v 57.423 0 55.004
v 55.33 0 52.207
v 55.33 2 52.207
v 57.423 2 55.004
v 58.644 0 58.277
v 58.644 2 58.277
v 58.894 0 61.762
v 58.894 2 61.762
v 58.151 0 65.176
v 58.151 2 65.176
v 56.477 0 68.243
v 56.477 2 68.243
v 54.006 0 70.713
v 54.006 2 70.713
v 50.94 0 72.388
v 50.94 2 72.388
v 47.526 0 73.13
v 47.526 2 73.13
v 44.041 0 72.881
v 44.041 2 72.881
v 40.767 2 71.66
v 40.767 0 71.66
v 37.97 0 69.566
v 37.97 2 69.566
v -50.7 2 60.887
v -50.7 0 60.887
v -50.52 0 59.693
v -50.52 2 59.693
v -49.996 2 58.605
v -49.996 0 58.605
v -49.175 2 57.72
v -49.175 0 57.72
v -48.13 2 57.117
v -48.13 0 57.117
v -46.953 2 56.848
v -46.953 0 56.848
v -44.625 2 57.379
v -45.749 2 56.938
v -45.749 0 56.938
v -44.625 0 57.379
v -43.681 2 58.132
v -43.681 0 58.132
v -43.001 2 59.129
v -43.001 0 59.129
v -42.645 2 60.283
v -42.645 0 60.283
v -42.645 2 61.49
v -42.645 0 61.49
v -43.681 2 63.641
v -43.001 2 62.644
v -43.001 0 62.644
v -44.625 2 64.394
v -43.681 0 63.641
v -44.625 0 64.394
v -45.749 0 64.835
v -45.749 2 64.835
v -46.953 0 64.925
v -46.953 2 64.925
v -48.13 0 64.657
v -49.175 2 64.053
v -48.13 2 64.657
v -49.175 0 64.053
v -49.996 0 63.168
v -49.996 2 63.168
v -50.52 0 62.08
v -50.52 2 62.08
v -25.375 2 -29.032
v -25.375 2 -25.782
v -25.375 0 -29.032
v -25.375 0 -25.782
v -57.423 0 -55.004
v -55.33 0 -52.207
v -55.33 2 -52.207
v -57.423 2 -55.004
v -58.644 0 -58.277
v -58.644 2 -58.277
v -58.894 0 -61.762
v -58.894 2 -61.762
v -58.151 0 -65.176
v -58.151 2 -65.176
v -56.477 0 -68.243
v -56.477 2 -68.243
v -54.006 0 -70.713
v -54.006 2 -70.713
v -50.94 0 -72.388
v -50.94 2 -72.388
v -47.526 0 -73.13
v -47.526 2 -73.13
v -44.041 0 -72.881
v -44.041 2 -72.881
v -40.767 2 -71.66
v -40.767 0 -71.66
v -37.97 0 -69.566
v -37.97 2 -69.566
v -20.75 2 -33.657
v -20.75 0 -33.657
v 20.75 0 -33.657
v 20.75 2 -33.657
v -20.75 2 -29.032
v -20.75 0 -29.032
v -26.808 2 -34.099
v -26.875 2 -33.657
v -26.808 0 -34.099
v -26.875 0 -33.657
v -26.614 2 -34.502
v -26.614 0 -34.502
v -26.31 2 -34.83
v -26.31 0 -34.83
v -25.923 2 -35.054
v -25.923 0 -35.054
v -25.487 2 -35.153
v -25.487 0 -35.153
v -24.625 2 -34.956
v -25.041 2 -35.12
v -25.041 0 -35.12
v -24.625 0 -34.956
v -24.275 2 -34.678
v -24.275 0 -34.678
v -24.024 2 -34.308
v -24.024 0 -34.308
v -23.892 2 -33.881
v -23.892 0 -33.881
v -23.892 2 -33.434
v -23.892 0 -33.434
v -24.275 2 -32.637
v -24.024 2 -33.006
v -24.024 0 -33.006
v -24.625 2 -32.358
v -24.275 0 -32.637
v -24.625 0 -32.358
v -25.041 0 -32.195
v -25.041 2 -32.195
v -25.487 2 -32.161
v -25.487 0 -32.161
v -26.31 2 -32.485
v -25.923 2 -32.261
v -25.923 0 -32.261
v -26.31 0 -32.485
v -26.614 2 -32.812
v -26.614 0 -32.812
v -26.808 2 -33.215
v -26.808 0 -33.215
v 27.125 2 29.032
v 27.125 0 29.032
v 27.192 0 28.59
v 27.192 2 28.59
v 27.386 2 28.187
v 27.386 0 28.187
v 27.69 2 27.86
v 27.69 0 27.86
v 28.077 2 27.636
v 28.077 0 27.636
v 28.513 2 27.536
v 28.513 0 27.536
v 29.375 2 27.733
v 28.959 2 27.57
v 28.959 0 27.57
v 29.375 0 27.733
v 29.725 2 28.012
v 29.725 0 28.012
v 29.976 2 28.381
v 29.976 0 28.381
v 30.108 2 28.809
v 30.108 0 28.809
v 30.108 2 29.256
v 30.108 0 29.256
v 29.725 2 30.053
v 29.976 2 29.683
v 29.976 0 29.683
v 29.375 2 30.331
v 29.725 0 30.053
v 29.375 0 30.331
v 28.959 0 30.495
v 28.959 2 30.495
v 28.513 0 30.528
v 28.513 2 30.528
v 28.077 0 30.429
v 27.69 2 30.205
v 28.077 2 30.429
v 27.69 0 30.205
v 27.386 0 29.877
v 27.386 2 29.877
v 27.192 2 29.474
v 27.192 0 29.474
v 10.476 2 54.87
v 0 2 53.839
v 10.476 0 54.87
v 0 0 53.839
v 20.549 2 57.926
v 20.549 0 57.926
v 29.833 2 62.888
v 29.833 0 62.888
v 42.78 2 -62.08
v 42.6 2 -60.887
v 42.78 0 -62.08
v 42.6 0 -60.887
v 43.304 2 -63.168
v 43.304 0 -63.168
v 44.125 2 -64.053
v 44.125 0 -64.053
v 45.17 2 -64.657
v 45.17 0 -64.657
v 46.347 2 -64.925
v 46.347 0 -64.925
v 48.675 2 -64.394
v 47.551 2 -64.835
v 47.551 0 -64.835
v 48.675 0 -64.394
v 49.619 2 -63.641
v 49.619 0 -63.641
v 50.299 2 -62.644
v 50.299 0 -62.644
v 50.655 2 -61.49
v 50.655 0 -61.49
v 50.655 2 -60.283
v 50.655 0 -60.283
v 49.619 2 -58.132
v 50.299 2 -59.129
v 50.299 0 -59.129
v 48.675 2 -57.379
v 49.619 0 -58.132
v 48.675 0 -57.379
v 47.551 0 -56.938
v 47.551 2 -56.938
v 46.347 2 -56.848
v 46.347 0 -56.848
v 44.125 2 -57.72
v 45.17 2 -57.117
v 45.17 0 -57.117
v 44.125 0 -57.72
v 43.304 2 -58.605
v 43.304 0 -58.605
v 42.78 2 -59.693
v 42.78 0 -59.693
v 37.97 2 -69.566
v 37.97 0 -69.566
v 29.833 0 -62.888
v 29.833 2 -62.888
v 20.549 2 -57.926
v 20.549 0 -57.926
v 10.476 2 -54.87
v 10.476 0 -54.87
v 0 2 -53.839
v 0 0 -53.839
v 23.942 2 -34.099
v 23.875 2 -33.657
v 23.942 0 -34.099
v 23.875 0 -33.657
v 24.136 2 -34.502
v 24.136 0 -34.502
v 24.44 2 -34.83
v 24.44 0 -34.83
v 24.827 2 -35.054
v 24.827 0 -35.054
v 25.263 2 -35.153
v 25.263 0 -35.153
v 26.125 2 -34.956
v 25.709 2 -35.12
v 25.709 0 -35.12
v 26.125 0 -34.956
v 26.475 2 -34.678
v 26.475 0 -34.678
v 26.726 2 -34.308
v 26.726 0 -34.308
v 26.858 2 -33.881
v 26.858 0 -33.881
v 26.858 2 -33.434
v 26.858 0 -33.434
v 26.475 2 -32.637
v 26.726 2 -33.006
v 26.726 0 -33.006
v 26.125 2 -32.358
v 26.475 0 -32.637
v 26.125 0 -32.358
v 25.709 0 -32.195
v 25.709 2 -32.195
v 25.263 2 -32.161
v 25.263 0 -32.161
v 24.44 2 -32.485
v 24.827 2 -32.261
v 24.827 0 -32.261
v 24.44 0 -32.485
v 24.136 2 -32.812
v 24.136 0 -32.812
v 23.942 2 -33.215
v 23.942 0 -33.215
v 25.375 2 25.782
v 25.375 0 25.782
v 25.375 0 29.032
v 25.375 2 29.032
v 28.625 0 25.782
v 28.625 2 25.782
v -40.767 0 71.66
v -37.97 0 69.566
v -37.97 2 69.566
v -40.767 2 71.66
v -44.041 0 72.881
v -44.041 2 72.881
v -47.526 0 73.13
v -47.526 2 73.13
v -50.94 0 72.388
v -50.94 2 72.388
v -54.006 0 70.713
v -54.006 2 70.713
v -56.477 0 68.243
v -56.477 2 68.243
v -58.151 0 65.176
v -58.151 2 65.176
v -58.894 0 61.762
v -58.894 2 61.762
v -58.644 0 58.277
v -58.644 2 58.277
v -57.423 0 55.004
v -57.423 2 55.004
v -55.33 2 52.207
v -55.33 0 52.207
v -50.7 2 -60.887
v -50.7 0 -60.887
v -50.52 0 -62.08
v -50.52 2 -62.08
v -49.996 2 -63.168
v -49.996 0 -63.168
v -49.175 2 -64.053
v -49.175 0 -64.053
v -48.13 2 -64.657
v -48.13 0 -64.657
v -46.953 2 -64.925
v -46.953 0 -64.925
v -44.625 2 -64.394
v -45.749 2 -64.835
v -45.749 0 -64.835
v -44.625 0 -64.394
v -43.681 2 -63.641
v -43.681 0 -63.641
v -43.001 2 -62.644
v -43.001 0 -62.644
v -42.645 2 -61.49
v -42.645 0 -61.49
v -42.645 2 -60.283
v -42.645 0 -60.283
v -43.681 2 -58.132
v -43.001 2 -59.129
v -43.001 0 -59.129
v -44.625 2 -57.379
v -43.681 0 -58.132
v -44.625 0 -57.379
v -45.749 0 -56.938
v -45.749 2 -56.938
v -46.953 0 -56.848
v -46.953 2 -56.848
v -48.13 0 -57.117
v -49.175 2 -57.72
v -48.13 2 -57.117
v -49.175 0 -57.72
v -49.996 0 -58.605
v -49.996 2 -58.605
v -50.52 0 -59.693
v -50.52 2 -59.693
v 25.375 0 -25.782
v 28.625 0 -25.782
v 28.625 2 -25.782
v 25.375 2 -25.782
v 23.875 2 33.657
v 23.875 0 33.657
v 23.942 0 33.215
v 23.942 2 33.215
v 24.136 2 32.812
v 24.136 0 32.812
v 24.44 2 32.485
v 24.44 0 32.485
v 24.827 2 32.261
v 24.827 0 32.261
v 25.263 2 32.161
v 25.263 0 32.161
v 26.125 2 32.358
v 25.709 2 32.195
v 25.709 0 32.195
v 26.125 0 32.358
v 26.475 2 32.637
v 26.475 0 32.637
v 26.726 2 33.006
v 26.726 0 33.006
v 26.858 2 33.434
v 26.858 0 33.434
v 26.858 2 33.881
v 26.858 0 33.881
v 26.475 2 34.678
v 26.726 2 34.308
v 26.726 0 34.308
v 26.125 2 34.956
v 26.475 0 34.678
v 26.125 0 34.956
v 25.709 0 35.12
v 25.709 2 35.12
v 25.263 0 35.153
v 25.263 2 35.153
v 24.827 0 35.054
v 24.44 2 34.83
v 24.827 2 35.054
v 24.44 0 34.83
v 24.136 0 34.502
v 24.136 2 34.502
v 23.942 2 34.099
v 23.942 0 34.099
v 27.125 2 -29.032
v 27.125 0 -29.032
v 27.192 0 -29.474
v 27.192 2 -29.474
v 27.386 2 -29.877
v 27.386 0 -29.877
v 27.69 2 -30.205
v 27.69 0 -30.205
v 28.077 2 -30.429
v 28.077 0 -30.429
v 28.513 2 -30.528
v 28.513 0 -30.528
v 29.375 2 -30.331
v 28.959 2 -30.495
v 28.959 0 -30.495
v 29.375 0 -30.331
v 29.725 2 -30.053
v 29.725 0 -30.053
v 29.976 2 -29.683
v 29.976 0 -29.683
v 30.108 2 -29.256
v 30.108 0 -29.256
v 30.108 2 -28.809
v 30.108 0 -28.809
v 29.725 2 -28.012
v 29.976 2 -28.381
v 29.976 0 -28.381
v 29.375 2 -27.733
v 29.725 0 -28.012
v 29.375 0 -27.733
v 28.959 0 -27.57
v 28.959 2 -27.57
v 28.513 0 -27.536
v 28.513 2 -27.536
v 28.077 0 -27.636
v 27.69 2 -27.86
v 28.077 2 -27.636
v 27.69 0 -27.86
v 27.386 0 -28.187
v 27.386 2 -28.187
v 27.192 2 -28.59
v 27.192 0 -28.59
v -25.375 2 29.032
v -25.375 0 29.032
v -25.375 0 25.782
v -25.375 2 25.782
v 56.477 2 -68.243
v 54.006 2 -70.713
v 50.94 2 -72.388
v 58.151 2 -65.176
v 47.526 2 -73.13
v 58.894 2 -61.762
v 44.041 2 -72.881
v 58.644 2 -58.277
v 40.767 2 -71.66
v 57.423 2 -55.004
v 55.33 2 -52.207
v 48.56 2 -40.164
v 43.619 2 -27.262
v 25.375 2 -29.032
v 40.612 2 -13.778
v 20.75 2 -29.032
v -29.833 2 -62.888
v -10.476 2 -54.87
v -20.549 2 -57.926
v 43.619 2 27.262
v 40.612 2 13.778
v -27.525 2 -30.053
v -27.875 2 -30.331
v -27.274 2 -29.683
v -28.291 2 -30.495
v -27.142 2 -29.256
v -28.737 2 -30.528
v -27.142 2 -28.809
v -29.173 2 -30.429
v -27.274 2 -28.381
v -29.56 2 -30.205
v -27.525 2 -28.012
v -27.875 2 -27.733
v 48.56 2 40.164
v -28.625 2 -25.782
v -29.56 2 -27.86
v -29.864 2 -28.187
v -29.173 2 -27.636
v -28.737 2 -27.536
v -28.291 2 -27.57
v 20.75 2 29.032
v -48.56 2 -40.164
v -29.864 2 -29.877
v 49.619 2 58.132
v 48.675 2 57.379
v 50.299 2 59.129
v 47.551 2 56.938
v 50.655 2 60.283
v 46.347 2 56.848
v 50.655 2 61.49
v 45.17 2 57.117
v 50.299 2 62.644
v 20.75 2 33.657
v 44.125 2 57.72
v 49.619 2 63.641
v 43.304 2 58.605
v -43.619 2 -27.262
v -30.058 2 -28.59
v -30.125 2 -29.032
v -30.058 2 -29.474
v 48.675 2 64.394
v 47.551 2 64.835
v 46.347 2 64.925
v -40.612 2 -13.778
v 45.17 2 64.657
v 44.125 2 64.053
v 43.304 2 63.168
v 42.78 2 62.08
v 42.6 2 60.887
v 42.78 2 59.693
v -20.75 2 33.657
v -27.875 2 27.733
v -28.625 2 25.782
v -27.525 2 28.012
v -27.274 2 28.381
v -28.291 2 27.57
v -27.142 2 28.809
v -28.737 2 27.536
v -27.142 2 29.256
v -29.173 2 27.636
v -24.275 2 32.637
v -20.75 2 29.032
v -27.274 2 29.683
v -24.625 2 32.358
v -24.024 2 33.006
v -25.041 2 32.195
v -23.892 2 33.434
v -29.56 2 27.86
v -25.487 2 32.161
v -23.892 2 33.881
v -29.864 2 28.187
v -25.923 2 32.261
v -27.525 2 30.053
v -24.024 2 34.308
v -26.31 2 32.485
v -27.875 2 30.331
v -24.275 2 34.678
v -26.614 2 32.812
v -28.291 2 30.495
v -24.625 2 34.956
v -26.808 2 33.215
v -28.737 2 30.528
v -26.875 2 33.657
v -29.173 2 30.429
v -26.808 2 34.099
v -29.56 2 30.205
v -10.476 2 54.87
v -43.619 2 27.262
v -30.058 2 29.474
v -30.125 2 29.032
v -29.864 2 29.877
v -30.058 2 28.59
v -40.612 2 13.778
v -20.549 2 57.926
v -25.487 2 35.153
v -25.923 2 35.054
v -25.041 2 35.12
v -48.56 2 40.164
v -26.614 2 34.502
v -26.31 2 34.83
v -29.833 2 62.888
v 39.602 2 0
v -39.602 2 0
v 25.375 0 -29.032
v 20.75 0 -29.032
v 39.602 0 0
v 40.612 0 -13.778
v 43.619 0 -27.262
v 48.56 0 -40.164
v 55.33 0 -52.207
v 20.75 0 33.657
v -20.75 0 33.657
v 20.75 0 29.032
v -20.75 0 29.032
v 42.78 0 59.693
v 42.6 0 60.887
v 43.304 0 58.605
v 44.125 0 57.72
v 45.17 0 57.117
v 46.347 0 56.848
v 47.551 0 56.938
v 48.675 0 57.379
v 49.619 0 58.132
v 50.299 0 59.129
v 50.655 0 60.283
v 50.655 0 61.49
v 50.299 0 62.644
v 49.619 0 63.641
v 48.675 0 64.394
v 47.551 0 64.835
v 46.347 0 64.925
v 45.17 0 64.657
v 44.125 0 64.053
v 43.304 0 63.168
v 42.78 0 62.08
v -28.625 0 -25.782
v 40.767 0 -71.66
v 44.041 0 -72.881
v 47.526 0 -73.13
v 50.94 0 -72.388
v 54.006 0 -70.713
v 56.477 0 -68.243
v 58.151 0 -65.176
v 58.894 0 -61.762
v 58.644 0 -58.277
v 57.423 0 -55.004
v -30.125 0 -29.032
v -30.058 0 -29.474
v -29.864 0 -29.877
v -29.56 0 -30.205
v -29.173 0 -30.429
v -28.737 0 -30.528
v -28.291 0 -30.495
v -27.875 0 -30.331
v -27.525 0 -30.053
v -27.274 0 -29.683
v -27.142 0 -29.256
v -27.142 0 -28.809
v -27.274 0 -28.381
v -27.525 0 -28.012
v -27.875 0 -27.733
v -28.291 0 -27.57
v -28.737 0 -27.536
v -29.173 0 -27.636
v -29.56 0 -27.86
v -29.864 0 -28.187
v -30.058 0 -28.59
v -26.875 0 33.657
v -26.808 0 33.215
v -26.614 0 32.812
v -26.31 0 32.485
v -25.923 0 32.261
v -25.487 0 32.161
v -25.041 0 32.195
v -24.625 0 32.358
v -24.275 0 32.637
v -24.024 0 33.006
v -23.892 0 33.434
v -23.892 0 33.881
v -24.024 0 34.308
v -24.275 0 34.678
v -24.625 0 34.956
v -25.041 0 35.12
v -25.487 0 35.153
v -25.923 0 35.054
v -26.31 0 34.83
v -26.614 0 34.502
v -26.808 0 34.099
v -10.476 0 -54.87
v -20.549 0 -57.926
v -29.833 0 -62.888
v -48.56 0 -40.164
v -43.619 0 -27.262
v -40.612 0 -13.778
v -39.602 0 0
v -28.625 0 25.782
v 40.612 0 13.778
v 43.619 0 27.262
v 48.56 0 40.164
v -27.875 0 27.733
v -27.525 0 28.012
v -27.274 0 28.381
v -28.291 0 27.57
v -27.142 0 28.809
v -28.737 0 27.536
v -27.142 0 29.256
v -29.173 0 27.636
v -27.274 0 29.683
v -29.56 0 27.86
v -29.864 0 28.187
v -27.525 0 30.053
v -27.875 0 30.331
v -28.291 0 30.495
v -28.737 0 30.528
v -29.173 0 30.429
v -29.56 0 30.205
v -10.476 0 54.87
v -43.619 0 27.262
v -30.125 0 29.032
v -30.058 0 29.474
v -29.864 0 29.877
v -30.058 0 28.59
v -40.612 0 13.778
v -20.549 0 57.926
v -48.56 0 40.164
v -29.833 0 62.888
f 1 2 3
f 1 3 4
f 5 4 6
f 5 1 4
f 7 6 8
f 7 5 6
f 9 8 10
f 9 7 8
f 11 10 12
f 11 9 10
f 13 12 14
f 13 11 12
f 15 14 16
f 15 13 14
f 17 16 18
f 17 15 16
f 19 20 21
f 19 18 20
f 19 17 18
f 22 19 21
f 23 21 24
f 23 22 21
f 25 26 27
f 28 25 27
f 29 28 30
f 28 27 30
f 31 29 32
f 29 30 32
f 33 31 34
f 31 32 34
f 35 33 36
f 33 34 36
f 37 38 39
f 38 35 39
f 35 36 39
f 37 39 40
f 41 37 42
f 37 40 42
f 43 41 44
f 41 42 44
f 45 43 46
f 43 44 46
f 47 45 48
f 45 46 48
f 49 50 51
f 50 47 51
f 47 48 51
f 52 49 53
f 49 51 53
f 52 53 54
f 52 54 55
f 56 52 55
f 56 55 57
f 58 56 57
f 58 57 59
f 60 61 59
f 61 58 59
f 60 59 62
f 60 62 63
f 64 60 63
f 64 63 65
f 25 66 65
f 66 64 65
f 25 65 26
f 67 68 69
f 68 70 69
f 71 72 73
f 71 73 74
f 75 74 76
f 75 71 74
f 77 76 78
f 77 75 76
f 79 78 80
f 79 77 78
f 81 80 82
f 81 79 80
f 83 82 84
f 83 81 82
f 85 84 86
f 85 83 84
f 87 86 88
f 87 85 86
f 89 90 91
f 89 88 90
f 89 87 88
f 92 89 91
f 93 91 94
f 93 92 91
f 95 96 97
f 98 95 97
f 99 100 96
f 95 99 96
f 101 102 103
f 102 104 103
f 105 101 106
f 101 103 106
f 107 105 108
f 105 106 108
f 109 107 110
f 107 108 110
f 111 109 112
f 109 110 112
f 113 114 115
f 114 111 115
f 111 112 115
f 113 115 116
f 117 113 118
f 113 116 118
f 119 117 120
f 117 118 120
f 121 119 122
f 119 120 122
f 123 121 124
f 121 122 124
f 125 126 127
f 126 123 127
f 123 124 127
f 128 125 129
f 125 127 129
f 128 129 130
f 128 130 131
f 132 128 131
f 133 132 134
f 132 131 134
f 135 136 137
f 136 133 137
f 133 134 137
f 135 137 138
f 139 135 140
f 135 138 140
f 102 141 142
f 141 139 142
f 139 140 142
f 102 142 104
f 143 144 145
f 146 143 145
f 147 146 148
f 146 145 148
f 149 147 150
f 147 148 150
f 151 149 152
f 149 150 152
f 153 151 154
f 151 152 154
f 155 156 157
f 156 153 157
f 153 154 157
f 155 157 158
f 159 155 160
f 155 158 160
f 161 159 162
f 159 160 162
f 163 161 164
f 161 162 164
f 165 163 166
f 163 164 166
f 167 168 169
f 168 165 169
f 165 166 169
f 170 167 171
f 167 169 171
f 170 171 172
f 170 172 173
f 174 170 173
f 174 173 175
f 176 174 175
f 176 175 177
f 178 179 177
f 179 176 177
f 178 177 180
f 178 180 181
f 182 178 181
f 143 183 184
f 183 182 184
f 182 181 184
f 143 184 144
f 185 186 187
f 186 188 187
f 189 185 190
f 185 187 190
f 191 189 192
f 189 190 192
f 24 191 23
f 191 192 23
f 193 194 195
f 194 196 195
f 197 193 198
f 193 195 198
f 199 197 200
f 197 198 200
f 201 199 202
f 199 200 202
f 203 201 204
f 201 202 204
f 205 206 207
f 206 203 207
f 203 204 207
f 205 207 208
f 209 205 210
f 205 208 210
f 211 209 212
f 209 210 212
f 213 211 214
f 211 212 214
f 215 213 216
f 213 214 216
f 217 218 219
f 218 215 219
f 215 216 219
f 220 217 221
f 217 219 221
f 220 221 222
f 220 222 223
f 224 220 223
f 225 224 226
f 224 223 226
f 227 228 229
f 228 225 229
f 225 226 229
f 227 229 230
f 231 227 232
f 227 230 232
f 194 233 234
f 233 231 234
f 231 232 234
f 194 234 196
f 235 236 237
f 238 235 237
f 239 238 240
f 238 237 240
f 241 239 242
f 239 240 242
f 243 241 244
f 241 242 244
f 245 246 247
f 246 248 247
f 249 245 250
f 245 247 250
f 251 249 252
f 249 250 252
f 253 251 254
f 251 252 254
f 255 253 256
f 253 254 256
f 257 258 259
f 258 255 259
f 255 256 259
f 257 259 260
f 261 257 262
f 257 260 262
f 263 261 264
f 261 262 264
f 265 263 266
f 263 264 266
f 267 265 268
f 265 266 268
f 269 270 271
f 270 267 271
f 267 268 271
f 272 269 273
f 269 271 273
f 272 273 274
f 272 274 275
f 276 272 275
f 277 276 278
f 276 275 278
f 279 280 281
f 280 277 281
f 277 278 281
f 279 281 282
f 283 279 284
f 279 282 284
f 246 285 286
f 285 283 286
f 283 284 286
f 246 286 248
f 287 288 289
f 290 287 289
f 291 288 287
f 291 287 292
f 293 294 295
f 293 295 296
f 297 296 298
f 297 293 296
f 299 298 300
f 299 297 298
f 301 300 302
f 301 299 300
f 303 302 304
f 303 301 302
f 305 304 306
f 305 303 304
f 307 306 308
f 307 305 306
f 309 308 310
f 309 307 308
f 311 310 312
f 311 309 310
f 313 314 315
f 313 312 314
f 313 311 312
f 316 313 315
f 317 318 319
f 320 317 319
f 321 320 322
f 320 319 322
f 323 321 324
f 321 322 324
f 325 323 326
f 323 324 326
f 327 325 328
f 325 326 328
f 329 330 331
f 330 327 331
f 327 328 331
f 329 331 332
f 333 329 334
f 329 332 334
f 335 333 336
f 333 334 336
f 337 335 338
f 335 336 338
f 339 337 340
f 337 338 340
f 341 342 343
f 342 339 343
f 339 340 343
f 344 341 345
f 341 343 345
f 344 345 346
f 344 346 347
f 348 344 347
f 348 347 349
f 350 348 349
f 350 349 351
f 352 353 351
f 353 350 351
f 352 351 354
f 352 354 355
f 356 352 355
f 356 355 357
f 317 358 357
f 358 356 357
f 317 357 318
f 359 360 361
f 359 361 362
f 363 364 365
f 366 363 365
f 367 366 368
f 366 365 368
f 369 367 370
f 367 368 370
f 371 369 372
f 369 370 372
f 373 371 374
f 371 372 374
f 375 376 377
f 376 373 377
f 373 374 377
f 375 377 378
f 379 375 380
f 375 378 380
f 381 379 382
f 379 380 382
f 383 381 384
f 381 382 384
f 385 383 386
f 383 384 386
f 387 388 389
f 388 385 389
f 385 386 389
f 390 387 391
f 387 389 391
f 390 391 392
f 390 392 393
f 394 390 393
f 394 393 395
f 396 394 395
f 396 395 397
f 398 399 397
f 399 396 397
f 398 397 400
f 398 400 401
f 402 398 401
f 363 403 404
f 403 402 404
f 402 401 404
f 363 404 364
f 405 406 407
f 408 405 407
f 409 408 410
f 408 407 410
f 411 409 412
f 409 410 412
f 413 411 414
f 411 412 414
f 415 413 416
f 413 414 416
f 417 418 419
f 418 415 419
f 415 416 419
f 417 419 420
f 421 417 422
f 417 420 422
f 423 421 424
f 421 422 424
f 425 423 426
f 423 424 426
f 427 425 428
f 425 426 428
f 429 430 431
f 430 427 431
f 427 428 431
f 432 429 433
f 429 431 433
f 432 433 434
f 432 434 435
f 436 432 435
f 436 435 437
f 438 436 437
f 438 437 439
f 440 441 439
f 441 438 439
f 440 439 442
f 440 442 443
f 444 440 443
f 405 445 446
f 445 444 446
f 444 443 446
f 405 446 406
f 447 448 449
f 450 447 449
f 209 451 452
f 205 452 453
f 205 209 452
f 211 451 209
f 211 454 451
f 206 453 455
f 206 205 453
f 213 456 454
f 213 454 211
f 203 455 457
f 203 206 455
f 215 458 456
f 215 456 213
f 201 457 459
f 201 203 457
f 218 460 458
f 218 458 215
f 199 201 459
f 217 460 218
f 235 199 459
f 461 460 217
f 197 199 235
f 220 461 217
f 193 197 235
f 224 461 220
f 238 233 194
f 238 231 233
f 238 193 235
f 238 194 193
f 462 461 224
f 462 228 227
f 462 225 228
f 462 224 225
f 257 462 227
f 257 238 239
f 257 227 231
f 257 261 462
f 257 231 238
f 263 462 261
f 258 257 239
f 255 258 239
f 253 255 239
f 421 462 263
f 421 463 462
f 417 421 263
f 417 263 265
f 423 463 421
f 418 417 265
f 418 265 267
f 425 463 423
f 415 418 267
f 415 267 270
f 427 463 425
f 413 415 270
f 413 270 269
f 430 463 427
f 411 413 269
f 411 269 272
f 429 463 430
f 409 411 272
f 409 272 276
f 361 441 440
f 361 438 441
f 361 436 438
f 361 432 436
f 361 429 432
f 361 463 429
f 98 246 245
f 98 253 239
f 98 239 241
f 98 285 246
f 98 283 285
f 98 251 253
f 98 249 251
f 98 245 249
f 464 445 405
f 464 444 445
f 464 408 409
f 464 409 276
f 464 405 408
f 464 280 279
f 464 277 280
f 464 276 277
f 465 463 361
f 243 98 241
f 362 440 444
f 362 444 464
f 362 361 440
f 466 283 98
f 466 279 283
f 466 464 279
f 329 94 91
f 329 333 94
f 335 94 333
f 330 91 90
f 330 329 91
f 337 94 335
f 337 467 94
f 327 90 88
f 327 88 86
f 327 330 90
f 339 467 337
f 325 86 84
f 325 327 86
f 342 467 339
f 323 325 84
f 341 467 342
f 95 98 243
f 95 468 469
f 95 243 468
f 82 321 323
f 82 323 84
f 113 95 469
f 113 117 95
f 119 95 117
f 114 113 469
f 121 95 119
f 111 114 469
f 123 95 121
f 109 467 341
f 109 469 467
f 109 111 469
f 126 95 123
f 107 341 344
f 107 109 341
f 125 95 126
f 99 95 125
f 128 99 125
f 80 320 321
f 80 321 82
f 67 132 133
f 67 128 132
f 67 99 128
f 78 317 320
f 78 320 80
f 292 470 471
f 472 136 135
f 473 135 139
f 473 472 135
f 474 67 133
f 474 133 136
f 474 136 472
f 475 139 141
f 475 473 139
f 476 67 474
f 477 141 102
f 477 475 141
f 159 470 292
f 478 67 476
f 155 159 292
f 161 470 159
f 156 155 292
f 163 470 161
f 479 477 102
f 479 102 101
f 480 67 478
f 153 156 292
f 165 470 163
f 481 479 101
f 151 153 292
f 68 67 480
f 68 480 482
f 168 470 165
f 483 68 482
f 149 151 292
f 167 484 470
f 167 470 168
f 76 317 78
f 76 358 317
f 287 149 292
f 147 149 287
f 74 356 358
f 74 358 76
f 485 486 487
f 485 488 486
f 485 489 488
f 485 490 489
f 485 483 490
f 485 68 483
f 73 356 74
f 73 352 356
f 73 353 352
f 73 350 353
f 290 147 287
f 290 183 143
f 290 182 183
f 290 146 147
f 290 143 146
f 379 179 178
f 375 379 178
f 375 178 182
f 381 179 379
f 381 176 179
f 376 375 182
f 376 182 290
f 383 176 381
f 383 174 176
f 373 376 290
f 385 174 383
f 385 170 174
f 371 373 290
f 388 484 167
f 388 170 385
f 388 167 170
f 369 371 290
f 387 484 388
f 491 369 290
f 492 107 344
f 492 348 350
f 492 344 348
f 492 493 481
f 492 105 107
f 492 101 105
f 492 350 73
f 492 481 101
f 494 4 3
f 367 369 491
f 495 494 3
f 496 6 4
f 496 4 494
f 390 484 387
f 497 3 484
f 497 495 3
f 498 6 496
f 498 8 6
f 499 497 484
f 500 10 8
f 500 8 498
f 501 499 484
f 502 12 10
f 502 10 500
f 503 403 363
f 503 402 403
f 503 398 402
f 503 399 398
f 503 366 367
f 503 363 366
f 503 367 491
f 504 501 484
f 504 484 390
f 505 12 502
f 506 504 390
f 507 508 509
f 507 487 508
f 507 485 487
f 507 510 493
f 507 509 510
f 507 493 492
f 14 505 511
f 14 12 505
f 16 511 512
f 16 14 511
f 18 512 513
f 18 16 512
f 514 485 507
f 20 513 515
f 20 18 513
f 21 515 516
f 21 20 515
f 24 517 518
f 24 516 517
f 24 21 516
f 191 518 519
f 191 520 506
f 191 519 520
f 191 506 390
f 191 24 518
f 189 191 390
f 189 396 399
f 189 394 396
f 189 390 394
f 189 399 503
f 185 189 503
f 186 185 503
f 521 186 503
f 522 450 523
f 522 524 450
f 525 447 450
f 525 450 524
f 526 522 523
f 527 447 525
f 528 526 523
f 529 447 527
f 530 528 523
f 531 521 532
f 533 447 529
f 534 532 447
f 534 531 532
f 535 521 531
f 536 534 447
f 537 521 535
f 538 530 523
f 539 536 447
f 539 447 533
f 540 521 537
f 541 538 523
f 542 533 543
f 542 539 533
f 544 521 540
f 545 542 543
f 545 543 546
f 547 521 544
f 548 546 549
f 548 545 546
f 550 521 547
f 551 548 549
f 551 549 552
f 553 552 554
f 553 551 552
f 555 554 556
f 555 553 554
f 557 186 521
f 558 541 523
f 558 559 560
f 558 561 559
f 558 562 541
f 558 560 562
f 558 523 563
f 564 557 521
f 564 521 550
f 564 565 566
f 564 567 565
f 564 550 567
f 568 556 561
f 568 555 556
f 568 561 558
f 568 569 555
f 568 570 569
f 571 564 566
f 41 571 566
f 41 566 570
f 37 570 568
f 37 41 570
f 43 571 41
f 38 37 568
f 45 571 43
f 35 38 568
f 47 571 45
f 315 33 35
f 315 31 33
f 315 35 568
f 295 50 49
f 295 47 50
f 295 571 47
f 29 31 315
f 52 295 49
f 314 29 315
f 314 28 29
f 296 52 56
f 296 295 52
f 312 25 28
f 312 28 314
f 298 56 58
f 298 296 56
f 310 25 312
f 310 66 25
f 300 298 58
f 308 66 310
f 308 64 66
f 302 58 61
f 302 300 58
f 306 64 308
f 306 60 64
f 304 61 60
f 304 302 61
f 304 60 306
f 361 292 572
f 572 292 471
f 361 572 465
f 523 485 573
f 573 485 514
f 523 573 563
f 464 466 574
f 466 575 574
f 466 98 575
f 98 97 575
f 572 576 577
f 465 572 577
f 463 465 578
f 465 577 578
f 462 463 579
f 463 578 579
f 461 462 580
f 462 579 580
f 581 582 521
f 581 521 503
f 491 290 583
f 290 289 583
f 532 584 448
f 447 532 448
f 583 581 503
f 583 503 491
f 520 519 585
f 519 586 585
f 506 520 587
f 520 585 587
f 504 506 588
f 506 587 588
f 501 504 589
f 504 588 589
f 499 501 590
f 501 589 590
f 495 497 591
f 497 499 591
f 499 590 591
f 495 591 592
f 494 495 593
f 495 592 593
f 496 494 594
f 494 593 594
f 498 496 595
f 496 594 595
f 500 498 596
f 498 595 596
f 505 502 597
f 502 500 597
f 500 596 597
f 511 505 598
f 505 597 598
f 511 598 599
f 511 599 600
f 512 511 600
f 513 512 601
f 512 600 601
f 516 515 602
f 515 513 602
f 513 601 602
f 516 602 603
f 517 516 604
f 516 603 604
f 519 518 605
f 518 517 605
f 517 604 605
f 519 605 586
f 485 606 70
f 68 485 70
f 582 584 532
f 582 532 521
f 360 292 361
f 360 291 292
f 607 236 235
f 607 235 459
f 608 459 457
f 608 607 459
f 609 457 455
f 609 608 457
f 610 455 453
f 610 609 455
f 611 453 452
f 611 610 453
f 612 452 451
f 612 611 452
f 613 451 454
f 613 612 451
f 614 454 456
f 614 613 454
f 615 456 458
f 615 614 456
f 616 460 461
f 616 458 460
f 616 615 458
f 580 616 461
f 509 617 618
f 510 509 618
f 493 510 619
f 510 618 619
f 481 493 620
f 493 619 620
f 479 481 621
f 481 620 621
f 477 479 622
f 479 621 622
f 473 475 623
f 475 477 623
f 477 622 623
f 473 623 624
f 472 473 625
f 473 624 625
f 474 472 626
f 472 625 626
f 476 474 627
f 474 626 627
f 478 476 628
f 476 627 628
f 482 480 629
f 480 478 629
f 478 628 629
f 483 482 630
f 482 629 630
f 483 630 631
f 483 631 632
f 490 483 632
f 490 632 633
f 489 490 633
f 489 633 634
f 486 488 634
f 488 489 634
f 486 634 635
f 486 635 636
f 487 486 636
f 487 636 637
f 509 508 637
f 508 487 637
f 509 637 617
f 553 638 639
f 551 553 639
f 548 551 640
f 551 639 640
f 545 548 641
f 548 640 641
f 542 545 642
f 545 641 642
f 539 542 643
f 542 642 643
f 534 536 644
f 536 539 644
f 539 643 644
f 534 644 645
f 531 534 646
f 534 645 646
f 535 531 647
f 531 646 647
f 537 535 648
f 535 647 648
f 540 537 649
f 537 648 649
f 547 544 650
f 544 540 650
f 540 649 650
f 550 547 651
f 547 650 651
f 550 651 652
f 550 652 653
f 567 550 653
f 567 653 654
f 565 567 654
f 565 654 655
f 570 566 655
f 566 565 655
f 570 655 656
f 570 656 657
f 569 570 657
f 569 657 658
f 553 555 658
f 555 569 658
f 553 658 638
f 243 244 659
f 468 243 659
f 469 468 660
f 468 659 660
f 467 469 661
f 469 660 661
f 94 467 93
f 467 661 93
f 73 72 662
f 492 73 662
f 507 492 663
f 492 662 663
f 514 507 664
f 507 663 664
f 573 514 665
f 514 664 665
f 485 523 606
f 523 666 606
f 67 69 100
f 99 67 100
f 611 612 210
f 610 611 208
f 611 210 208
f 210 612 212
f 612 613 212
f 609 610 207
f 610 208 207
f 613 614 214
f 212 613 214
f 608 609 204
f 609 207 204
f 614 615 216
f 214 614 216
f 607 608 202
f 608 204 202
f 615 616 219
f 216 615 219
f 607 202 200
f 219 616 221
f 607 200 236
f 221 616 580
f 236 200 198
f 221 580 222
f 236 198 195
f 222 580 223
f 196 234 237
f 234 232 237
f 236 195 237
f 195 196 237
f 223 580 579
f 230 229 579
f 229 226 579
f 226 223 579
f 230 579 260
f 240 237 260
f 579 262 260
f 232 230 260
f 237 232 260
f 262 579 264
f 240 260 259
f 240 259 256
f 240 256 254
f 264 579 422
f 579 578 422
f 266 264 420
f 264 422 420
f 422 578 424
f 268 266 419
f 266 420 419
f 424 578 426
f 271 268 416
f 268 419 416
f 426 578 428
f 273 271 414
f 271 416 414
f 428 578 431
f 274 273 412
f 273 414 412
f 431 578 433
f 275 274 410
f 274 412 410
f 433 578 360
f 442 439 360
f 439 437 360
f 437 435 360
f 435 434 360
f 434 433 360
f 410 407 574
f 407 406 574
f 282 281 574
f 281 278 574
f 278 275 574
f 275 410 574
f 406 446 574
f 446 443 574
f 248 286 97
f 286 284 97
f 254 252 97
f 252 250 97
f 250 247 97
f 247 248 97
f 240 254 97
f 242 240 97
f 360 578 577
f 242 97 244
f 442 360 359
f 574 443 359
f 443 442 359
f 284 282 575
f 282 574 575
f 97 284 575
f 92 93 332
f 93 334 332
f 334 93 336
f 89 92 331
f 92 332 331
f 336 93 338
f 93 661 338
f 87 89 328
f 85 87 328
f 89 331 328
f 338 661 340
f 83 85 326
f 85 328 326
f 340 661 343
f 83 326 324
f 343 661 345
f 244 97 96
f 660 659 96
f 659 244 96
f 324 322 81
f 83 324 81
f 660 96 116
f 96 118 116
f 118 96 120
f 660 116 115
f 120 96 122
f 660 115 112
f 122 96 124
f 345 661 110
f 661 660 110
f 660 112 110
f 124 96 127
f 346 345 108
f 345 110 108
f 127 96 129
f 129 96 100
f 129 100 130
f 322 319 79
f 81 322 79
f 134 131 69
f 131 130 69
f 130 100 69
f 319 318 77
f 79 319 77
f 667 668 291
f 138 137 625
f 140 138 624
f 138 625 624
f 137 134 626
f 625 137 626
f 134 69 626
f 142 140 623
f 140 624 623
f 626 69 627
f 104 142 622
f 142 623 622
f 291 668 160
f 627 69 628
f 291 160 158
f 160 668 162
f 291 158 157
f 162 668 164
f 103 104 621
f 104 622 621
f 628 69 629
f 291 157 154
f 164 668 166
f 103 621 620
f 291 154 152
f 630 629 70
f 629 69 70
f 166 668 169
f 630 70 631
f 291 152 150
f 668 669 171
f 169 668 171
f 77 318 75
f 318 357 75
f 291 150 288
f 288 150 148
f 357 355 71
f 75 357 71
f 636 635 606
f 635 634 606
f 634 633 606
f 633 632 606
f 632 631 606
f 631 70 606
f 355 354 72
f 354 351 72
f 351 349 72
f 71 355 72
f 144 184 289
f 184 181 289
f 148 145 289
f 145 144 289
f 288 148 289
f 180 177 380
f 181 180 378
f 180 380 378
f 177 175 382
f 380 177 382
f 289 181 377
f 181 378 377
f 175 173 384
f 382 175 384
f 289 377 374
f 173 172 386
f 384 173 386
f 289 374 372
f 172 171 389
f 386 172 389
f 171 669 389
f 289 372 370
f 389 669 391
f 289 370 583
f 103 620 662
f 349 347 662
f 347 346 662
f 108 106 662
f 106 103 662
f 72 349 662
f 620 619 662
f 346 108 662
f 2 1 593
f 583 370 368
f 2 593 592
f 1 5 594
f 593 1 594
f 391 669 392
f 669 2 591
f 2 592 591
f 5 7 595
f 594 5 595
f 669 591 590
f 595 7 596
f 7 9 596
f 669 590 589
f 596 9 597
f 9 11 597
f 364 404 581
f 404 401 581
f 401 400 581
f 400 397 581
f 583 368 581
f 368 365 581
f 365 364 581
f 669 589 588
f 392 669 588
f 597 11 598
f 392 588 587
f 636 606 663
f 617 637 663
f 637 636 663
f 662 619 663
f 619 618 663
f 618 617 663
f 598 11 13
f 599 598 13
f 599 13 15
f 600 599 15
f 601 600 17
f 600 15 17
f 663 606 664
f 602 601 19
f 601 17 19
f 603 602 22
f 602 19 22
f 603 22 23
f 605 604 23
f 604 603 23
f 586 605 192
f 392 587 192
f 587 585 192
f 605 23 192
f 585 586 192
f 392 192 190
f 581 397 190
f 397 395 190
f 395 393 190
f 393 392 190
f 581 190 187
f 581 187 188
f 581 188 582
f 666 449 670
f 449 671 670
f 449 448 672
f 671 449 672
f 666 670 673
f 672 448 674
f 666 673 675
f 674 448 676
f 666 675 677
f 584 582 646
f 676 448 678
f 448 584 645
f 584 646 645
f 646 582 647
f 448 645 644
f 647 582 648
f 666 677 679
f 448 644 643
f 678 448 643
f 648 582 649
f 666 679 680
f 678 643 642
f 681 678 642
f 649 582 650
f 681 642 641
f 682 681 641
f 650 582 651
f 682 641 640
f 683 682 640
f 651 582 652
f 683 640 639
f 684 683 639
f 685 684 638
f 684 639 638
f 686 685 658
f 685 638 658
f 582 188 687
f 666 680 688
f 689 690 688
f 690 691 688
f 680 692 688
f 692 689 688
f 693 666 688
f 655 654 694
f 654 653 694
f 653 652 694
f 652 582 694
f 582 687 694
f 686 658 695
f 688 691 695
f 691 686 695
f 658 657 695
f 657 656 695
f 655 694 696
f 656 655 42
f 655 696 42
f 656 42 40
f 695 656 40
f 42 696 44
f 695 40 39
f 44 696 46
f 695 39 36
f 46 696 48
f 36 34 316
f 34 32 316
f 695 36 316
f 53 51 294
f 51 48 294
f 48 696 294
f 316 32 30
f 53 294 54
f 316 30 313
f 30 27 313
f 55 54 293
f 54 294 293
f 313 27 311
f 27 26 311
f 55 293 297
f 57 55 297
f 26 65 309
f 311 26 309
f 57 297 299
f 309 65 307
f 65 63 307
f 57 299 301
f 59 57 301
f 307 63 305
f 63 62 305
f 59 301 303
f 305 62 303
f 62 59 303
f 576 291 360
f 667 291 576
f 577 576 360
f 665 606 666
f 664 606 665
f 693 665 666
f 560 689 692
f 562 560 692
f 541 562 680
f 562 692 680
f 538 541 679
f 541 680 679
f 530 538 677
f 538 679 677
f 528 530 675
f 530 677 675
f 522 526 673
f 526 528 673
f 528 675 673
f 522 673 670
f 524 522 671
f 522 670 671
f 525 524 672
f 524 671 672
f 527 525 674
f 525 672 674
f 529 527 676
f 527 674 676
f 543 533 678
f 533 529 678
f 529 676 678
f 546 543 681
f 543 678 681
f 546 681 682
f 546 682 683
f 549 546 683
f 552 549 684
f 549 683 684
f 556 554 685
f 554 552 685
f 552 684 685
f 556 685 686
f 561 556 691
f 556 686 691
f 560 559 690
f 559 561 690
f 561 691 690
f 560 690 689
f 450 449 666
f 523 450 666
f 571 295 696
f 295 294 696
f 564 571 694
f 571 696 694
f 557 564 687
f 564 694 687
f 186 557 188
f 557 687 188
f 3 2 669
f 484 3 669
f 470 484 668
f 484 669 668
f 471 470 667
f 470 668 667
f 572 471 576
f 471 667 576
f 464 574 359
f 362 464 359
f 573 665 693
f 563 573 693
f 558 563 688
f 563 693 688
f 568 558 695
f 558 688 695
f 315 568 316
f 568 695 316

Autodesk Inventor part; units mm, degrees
ref_plane "YZ Plane" through (0, 0, 0) normal (1, 0, 0) x (0, 1, 0)
ref_plane "XZ Plane" through (0, 0, 0) normal (0, 1, 0) x (-1, 0, 0)
ref_plane "XY Plane" through (0, 0, 0) normal (0, 0, 1) x (1, 0, 0)
sketch "Sketch1" plane through (0, 0, 0) normal (0, 1, 0) x (-1, 0, 0)
  circle A0 centre (-28.625, 29.0323) radius 1.5
  circle A1 centre (-25.375, 33.6573) radius 1.5
  arc A2 (-37.9702, 69.5664) -> (0, 53.8386) centre (0, 107.5366) ccw
  arc A3 (-39.6019, 0) -> (-55.3297, 52.2069) centre (-134.1138, 0) ccw
  circle A4 centre (-46.65, 60.8866) radius 4.05
  arc A5 (-37.9702, 69.5664) -> (-55.3297, 52.2069) centre (-46.65, 60.8866) ccw
  arc A6 (-55.3297, -52.2069) -> (-39.6019, 0) centre (-134.1138, 0) ccw
  circle A7 centre (-28.625, -29.0323) radius 1.5
  circle A8 centre (-25.375, -33.6573) radius 1.5
  circle A9 centre (-46.65, -60.8866) radius 4.05
  arc A10 (-55.3297, -52.2069) -> (-37.9702, -69.5664) centre (-46.65, -60.8866) ccw
  arc A11 (0, -53.8386) -> (-37.9702, -69.5664) centre (0, -107.5366) ccw
  arc A12 (39.6019, 0) -> (55.3297, -52.2069) centre (134.1138, 0) ccw
  circle A13 centre (28.625, -29.0323) radius 1.5
  circle A14 centre (25.375, -33.6573) radius 1.5
  arc A15 (37.9702, -69.5664) -> (0, -53.8386) centre (0, -107.5366) ccw
  circle A16 centre (46.65, -60.8866) radius 4.05
  arc A17 (37.9702, -69.5664) -> (55.3297, -52.2069) centre (46.65, -60.8866) ccw
  circle A18 centre (28.625, 29.0323) radius 1.5
  circle A19 centre (25.375, 33.6573) radius 1.5
  arc A20 (0, 53.8386) -> (37.9702, 69.5664) centre (0, 107.5366) ccw
  arc A21 (55.3297, 52.2069) -> (39.6019, 0) centre (134.1138, 0) ccw
  circle A22 centre (46.65, 60.8866) radius 4.05
  arc A23 (55.3297, 52.2069) -> (37.9702, 69.5664) centre (46.65, 60.8866) ccw
  arc A24 (55.3297, 52.2069) -> (37.9702, 69.5664) centre (46.65, 60.8866) ccw
  arc A25 (-37.9702, 69.5664) -> (-55.3297, 52.2069) centre (-46.65, 60.8866) ccw
  arc A26 (-55.3297, -52.2069) -> (-37.9702, -69.5664) centre (-46.65, -60.8866) ccw
  circle A27 centre (-46.65, -60.8866) radius 4.05
  circle A28 centre (46.65, -60.8866) radius 4.05
  circle A29 centre (46.65, 60.8866) radius 4.05
  circle A30 centre (-46.65, 60.8866) radius 4.05
  circle A31 centre (-25.375, -33.6573) radius 1.5
  circle A32 centre (-28.625, -29.0323) radius 1.5
  circle A33 centre (25.375, -33.6573) radius 1.5
  circle A34 centre (28.625, -29.0323) radius 1.5
  circle A35 centre (28.625, 29.0323) radius 1.5
  circle A36 centre (25.375, 33.6573) radius 1.5
  circle A37 centre (-28.625, 29.0323) radius 1.5
  circle A38 centre (-25.375, 33.6573) radius 1.5
  arc A39 (-37.9702, 69.5664) -> (37.9702, 69.5664) centre (0, 107.5366) ccw
  arc A40 (55.3297, 52.2069) -> (55.3297, -52.2069) centre (134.1138, 0) ccw
  arc A41 (-55.3297, -52.2069) -> (-55.3297, 52.2069) centre (-134.1138, 0) ccw
  arc A42 (37.9702, -69.5664) -> (-37.9702, -69.5664) centre (0, -107.5366) ccw
  line L0 (28.625, -25.7823) -> (25.375, -25.7823)
  line L1 (25.375, 25.7823) -> (28.625, 25.7823)
  line L2 (28.625, 25.7823) -> (28.625, -25.7823)
  line L3 (-28.625, -25.7823) -> (-25.375, -25.7823)
  line L4 (-25.375, 25.7823) -> (-28.625, 25.7823)
  line L5 (-28.625, 25.7823) -> (-28.625, -25.7823)
  line L6 (20.75, -33.6573) -> (-20.75, -33.6573)
  line L7 (-20.75, -33.6573) -> (-20.75, -29.0323)
  line L8 (20.75, -29.0323) -> (20.75, -33.6573)
  line L9 (20.75, 33.6573) -> (-20.75, 33.6573)
  line L10 (-20.75, 33.6573) -> (-20.75, 29.0323)
  line L11 (20.75, 29.0323) -> (20.75, 33.6573)
  line L12 (25.375, 29.0323) -> (25.375, 25.7823)
  line L13 (25.375, -25.7823) -> (25.375, -29.0323)
  line L14 (25.375, -29.0323) -> (20.75, -29.0323)
  line L15 (-20.75, -29.0323) -> (-25.375, -29.0323)
  line L16 (-25.375, -29.0323) -> (-25.375, -25.7823)
  line L17 (-25.375, 25.7823) -> (-25.375, 29.0323)
  line L18 (-25.375, 29.0323) -> (-20.75, 29.0323)
  line L19 (20.75, 29.0323) -> (25.375, 29.0323)
  point P0 (-25.25, 18.3592)
  point P1 (-4.2075, 54.5249)
  point P2 (-4.2075, -54.5249)
  point P3 (25.25, 18.3592)
  point P4 (4.2075, -54.5249)
  point P5 (4.2075, 54.5249)
  dimension "d0" = 3.25
  dimension "d1" = 3.25
  dimension "d2" = 4.625
  dimension "d3" = 4.625
extrude "Extrusion1" add sketch "Sketch1" along normal blind 2
properties part number "atas4"
